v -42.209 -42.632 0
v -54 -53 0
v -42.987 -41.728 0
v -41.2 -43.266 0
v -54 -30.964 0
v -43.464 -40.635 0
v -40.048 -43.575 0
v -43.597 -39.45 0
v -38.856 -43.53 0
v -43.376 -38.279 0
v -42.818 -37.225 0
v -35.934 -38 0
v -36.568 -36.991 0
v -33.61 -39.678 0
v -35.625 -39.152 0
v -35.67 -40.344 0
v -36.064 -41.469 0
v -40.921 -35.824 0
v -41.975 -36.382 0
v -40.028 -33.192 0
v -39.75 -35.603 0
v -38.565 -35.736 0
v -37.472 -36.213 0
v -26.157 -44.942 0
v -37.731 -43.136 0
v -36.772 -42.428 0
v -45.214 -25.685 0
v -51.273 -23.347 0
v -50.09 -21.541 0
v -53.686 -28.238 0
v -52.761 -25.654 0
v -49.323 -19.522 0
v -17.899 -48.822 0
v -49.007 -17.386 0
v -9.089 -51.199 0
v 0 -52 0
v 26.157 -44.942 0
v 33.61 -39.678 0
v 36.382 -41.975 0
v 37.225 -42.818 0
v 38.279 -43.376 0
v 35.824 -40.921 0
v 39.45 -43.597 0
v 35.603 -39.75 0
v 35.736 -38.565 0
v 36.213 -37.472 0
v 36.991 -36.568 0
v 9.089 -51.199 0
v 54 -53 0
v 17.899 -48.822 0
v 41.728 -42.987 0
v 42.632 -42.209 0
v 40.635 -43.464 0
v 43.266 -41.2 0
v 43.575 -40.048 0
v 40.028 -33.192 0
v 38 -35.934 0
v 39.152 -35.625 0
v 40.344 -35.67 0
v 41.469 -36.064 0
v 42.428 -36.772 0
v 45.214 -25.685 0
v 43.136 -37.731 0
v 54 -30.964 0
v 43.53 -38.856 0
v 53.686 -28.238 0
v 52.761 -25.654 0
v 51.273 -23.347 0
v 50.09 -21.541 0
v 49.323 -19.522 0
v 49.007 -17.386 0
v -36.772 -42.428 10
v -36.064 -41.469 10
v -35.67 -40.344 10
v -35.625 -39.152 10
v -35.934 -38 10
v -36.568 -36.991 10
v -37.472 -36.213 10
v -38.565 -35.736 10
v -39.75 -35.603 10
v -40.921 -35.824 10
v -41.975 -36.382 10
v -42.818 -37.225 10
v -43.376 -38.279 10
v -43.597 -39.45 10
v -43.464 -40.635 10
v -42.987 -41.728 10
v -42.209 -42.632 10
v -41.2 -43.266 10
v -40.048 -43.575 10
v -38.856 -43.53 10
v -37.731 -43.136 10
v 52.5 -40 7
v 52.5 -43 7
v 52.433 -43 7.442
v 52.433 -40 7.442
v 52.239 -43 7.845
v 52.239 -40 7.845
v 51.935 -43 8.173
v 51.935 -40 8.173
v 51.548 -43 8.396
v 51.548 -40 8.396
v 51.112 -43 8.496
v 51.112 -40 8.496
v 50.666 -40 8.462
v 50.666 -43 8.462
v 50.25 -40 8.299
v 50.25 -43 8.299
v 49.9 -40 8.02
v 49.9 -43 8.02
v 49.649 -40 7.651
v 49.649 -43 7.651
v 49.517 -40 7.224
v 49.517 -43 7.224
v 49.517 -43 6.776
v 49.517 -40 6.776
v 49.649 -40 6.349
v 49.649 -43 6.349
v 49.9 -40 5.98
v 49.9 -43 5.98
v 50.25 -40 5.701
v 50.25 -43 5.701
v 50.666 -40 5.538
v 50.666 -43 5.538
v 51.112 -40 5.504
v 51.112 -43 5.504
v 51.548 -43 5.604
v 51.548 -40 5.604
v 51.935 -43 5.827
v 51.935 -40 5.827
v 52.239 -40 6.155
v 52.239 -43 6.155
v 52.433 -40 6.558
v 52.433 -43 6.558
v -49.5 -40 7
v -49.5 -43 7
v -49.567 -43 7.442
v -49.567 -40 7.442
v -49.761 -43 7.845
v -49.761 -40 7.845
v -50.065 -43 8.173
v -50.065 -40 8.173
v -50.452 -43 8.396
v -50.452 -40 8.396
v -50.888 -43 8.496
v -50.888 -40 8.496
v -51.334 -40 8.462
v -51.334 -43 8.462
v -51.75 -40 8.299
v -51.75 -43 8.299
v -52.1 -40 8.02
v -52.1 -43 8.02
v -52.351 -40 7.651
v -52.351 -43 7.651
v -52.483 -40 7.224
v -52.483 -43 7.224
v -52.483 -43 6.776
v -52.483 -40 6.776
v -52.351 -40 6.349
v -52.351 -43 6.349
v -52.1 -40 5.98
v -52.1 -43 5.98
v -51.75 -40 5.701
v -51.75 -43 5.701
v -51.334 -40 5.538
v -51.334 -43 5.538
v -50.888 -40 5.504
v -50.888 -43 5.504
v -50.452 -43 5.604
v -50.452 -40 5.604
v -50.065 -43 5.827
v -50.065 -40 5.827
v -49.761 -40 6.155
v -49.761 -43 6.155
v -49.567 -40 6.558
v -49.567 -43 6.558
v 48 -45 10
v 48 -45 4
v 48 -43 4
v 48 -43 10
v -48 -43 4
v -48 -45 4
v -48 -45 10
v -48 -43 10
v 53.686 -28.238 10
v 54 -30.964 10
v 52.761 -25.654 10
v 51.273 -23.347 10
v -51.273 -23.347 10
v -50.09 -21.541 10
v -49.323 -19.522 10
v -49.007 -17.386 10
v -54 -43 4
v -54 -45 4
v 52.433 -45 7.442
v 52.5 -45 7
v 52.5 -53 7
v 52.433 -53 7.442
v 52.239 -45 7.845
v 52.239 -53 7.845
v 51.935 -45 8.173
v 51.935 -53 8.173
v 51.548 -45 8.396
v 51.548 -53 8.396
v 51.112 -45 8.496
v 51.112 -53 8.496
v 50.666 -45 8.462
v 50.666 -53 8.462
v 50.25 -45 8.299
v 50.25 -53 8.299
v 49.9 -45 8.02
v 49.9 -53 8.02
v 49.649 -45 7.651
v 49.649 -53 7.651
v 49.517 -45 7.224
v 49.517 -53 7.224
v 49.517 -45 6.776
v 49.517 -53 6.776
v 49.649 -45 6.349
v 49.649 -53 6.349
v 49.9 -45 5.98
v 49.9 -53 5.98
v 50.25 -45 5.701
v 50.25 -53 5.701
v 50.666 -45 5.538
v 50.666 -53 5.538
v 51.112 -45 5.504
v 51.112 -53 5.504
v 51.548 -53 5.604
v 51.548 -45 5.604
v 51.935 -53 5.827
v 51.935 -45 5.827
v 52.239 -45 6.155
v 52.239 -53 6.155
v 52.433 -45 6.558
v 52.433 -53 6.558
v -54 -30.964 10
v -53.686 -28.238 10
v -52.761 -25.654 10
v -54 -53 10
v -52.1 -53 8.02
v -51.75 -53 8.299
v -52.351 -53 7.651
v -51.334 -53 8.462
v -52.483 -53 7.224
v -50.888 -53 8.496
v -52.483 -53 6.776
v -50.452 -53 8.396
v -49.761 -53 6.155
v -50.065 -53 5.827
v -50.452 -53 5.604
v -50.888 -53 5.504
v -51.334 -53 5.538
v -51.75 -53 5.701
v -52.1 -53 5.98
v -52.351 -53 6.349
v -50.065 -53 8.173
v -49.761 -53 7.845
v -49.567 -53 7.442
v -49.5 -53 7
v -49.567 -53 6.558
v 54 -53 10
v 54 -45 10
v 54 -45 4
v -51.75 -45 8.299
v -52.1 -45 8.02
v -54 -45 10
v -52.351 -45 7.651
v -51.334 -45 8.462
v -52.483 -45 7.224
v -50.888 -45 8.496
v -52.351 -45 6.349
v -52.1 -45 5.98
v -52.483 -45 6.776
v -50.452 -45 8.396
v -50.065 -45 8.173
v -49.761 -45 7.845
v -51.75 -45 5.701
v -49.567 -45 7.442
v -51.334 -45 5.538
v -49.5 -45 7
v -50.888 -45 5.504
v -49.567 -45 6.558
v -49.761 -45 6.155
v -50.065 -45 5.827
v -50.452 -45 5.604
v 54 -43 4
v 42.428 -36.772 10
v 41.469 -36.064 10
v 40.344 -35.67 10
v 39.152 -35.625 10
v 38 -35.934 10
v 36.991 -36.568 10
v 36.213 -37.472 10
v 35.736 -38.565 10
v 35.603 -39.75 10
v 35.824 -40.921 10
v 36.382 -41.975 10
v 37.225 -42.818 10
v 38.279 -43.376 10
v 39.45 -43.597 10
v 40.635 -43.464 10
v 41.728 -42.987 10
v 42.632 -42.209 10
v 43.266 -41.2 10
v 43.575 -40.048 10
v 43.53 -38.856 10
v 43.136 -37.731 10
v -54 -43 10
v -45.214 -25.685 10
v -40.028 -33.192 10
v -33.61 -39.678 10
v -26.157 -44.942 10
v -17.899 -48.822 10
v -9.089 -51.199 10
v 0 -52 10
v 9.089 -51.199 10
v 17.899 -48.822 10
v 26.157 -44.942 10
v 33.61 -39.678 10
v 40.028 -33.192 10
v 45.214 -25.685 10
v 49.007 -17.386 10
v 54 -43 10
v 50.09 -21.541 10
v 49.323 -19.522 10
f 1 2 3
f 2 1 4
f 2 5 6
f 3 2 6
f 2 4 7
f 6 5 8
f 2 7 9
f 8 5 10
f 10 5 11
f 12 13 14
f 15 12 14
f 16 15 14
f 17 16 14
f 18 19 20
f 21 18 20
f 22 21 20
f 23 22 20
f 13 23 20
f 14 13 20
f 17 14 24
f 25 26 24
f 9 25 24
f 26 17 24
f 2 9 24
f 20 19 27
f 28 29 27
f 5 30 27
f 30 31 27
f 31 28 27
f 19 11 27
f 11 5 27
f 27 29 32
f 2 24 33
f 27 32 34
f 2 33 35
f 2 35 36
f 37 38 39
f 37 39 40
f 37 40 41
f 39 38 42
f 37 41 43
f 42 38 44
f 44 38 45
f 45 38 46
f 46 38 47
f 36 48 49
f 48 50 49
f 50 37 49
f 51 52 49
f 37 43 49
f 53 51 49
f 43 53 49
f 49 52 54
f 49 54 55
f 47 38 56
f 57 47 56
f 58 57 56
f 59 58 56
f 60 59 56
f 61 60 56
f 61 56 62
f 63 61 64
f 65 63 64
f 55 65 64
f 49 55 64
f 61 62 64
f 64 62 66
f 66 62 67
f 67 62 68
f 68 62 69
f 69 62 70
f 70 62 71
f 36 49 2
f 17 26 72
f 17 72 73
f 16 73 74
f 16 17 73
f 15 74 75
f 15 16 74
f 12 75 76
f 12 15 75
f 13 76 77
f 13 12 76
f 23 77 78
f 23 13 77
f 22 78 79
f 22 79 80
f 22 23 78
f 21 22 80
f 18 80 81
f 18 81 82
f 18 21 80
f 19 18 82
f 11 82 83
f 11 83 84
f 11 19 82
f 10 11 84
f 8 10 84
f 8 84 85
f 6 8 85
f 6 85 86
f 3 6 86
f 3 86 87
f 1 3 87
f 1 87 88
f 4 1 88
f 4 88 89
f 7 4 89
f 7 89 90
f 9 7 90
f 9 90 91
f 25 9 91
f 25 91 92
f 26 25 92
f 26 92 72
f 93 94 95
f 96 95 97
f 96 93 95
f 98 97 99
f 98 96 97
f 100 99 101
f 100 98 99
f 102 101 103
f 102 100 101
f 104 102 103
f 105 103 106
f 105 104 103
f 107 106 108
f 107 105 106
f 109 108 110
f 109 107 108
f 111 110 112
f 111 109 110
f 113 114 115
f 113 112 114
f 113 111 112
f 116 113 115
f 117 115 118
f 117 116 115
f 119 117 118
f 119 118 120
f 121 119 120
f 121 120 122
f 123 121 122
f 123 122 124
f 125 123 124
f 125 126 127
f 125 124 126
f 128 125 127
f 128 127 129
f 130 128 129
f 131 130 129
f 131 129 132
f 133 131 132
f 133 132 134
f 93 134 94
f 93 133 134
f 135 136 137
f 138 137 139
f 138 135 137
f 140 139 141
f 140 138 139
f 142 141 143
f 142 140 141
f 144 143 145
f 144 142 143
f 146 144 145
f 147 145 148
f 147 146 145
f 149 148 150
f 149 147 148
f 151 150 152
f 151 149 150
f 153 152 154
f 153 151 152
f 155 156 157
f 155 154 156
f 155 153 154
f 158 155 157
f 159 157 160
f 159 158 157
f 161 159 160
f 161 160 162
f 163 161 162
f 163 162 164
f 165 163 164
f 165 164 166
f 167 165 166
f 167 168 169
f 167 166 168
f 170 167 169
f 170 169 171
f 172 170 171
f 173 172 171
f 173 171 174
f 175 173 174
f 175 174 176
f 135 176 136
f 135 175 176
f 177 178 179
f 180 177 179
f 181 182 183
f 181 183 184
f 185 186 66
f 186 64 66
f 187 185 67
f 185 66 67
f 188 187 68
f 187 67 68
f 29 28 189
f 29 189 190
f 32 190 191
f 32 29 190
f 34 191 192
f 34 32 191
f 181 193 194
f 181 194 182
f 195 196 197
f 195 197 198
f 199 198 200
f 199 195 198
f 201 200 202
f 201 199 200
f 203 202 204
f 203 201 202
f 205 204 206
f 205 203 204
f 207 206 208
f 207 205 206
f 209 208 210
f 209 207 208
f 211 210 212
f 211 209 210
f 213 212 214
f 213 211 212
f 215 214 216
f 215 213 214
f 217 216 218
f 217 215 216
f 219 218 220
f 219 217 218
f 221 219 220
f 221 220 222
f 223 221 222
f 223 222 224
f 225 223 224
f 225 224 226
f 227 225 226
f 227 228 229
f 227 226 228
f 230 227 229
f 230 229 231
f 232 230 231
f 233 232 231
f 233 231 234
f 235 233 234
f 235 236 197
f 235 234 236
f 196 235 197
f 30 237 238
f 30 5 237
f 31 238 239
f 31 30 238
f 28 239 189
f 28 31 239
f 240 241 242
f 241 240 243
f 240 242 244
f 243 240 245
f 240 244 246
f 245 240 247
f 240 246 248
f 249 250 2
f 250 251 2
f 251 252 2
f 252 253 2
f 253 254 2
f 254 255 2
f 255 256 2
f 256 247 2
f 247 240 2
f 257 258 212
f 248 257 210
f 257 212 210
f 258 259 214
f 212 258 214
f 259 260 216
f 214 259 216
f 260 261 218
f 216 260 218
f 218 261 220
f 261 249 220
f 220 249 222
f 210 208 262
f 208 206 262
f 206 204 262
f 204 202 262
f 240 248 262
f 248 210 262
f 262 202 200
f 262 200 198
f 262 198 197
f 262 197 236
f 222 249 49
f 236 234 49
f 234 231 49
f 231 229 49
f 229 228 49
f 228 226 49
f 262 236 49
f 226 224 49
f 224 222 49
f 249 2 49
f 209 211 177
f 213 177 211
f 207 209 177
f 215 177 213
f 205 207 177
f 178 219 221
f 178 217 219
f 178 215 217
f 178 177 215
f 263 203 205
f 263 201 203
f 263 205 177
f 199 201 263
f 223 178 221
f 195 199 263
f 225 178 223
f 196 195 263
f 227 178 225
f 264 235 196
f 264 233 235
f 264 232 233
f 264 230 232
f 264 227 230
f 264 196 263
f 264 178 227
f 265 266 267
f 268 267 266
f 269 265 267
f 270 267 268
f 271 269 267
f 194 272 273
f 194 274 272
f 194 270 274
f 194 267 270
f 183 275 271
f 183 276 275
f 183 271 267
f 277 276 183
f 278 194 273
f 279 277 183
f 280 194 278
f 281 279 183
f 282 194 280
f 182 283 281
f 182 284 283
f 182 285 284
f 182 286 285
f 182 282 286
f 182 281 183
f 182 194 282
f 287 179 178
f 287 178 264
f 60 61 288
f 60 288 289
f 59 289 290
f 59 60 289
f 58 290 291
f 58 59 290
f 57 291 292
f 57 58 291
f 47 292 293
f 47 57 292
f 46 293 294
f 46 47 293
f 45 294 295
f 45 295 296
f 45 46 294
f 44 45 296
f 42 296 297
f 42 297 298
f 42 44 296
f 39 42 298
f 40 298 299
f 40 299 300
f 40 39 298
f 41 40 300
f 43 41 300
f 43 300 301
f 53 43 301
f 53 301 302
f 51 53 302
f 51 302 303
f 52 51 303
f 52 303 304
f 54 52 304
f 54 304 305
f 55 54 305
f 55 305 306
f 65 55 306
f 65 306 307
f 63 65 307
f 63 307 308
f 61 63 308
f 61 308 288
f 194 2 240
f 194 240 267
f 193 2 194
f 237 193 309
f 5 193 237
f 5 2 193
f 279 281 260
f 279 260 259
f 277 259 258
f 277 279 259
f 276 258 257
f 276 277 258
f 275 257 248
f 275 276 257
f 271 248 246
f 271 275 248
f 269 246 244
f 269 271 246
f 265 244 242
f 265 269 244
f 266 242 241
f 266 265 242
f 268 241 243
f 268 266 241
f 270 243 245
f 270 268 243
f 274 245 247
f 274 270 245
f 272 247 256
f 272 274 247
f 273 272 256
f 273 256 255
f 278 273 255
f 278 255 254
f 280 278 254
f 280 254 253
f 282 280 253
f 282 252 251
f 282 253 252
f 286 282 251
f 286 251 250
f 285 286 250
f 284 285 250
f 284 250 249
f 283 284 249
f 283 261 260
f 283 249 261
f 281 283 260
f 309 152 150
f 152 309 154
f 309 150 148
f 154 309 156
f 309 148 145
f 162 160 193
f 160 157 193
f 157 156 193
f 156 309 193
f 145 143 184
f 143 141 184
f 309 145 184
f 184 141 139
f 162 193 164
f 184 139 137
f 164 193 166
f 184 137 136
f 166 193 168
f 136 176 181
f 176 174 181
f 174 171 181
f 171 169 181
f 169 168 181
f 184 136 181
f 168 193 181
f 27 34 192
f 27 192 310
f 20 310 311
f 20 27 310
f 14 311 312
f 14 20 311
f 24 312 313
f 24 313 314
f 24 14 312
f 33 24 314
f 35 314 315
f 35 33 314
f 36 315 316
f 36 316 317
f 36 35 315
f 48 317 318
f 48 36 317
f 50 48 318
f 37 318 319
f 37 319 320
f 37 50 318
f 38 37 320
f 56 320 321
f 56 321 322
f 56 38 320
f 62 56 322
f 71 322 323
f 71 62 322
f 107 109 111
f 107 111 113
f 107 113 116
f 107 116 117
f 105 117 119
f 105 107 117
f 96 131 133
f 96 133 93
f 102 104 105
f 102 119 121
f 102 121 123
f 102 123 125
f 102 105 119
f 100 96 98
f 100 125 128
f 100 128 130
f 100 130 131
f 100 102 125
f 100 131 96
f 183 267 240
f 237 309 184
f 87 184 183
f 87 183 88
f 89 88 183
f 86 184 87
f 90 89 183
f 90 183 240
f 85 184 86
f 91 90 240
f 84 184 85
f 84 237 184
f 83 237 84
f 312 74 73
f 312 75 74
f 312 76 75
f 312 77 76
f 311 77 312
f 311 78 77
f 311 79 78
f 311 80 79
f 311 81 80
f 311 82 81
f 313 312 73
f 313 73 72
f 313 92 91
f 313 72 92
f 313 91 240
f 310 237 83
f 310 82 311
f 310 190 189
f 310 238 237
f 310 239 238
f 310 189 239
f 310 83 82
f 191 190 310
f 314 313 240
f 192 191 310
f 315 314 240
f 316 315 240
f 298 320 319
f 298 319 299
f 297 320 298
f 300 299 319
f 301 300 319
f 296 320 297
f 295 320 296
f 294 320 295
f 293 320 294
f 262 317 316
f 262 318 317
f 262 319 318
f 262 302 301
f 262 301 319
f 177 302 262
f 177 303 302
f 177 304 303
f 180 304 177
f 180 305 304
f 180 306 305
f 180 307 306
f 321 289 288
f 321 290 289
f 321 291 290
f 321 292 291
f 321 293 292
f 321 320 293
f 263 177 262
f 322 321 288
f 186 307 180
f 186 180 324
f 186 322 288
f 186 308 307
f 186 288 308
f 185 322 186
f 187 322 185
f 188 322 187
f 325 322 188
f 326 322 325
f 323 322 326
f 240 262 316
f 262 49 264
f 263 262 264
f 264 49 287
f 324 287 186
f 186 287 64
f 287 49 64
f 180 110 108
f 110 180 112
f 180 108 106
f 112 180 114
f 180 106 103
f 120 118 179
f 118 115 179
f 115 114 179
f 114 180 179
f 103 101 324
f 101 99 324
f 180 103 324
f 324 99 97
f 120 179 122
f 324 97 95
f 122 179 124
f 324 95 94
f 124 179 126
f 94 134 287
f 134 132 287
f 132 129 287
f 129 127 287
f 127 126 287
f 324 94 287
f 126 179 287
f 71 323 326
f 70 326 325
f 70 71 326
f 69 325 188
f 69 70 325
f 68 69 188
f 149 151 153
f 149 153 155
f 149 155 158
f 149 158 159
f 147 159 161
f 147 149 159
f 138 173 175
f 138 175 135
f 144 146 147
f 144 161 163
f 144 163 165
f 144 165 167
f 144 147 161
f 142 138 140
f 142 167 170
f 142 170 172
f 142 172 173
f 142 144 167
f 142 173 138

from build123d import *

# Parameters (mm, degrees)
CYLINDER870_R               = 1.5
CYLINDER870_DEPTH           = 20
CYLINDER865_R               = 1.5
CYLINDER865_DEPTH           = 20
CYLINDER862_R               = 1.5
CYLINDER862_DEPTH           = 20
CYLINDER868_R               = 1.5
CYLINDER868_DEPTH           = 20
BOX131_W                    = 6
BOX131_H                    = 2
BOX131_DEPTH                = 6
BOX130_W                    = 6
BOX130_H                    = 2
BOX130_DEPTH                = 6
BOX133_W                    = 6
BOX133_H                    = 2
BOX133_DEPTH                = 6
BOX132_W                    = 6
BOX132_H                    = 2
BOX132_DEPTH                = 6
CYLINDER872_R               = 4
CYLINDER872_DEPTH           = 20
CYLINDER872_PLACEMENT_ANGLE = 45
CYLINDER871_R               = 4
CYLINDER871_DEPTH           = 20
CYLINDER871_PLACEMENT_ANGLE = 45
CYLINDER863_R               = 10
CYLINDER863_DEPTH           = 40
CYLINDER908_R               = 10
CYLINDER908_DEPTH           = 40
CYLINDER864_R               = 52
CYLINDER864_DEPTH           = 10
BOX129_W                    = 108
BOX129_H                    = 36
BOX129_DEPTH                = 10
FILLET013_R                 = 12


with BuildPart() as v_lec870:
    # Cylinder870 → Cylinder870 (new body)
    with BuildSketch(Plane(origin=(20, -40, -5), x_dir=(1, 0, 0), z_dir=(0, -1, 0))):
        Circle(CYLINDER870_R)
    extrude(amount=CYLINDER870_DEPTH)


with BuildPart() as v_lec865:
    # Cylinder865 → Cylinder865 (new body)
    with BuildSketch(Plane(origin=(51, -40, 7), x_dir=(1, 0, 0), z_dir=(0, -1, 0))):
        Circle(CYLINDER865_R)
    extrude(amount=CYLINDER865_DEPTH)


with BuildPart() as v_lec862:
    # Cylinder862 → Cylinder862 (new body)
    with BuildSketch(Plane(origin=(-51, -40, 7), x_dir=(1, 0, 0), z_dir=(0, -1, 0))):
        Circle(CYLINDER862_R)
    extrude(amount=CYLINDER862_DEPTH)


with BuildPart() as compound261:
    # Cylinder868 → Cylinder868 (new body)
    with BuildSketch(Plane(origin=(-20, -40, -5), x_dir=(1, 0, 0), z_dir=(0, -1, 0))):
        Circle(CYLINDER868_R)
    extrude(amount=CYLINDER868_DEPTH)

    # Compound261: union Válec870, Válec865, Válec862
    add(v_lec870.part)
    add(v_lec865.part)
    add(v_lec862.part)


with BuildPart() as krychle131:
    # Box131 → Box131 (new body)
    with BuildSketch(Plane(origin=(17, -47, -8), x_dir=(1, 0, 0), z_dir=(0, 0, 1))):
        with Locations((3, 1)):
            Rectangle(BOX131_W, BOX131_H)
    extrude(amount=BOX131_DEPTH)


with BuildPart() as krychle130:
    # Box130 → Box130 (new body)
    with BuildSketch(Plane(origin=(48, -45, 4), x_dir=(1, 0, 0), z_dir=(0, 0, 1))):
        with Locations((3, 1)):
            Rectangle(BOX130_W, BOX130_H)
    extrude(amount=BOX130_DEPTH)


with BuildPart() as krychle133:
    # Box133 → Box133 (new body)
    with BuildSketch(Plane(origin=(-54, -45, 4), x_dir=(1, 0, 0), z_dir=(0, 0, 1))):
        with Locations((3, 1)):
            Rectangle(BOX133_W, BOX133_H)
    extrude(amount=BOX133_DEPTH)


with BuildPart() as compound258:
    # Box132 → Box132 (new body)
    with BuildSketch(Plane(origin=(-23, -47, -8), x_dir=(1, 0, 0), z_dir=(0, 0, 1))):
        with Locations((3, 1)):
            Rectangle(BOX132_W, BOX132_H)
    extrude(amount=BOX132_DEPTH)

    # Compound258: union Krychle131, Krychle130, Krychle133
    add(krychle131.part)
    add(krychle130.part)
    add(krychle133.part)


with BuildPart() as v_lec872:
    # Cylinder872 → Cylinder872 (new body)
    with BuildSketch(Plane.XY):
        Circle(CYLINDER872_R)
    extrude(amount=CYLINDER872_DEPTH)


with BuildPart() as v_lec872_1:
    # Cylinder872 placement: moved
    add(v_lec872.part.moved(Location((39.6, -39.6, -10))).rotate(Axis((39.6, -39.6, -10), (0, 0, 1)), CYLINDER872_PLACEMENT_ANGLE))


with BuildPart() as compound259:
    # Cylinder871 → Cylinder871 (new body)
    with BuildSketch(Plane.XY):
        Circle(CYLINDER871_R)
    extrude(amount=CYLINDER871_DEPTH)


with BuildPart() as compound259_1:
    # Cylinder871 placement: moved
    add(compound259.part.moved(Location((-39.6, -39.6, -10))).rotate(Axis((-39.6, -39.6, -10), (0, 0, -1)), CYLINDER871_PLACEMENT_ANGLE))

    # Compound259: union Válec872
    add(v_lec872_1.part)


with BuildPart() as v_lec863:
    # Cylinder863 → Cylinder863 (new body)
    with BuildSketch(Plane(origin=(-59, -17, 0), x_dir=(1, 0, 0), z_dir=(0, 0, 1))):
        Circle(CYLINDER863_R)
    extrude(amount=CYLINDER863_DEPTH)


with BuildPart() as compound260:
    # Cylinder908 → Cylinder908 (new body)
    with BuildSketch(Plane(origin=(59, -17, 0), x_dir=(1, 0, 0), z_dir=(0, 0, 1))):
        Circle(CYLINDER908_R)
    extrude(amount=CYLINDER908_DEPTH)

    # Compound260: union Válec863
    add(v_lec863.part)


with BuildPart() as v_lec864:
    # Cylinder864 → Cylinder864 (new body)
    with BuildSketch(Plane.XY.offset(20)):
        Circle(CYLINDER864_R)
    extrude(amount=CYLINDER864_DEPTH)


with BuildPart() as fillet013:
    # Box129 → Box129 (new body)
    with BuildSketch(Plane(origin=(-54, -53, 20), x_dir=(1, 0, 0), z_dir=(0, 0, 1))):
        with Locations((54, 18)):
            Rectangle(BOX129_W, BOX129_H)
    extrude(amount=BOX129_DEPTH)

    # Cut147: cut Válec864
    add(v_lec864.part, mode=Mode.SUBTRACT)


with BuildPart() as fillet013_1:
    # Cut147 placement: moved
    add(fillet013.part.moved(Location((0, 0, -20))))

    # Cut146: cut Compound260
    add(compound260.part, mode=Mode.SUBTRACT)

    # Cut149: cut Compound259
    add(compound259_1.part, mode=Mode.SUBTRACT)

    # Cut148: cut Compound258
    add(compound258.part, mode=Mode.SUBTRACT)

    # Cut150: cut Compound261
    add(compound261.part, mode=Mode.SUBTRACT)

    # Fillet013
    fillet013_edges = [fillet013_1.edges().sort_by_distance(p)[0] for p in [
        (-54, -25.660254, 5),
        (54, -25.660254, 5),
    ]]
    fillet(fillet013_edges, radius=FILLET013_R)


solid = fillet013_1.part
